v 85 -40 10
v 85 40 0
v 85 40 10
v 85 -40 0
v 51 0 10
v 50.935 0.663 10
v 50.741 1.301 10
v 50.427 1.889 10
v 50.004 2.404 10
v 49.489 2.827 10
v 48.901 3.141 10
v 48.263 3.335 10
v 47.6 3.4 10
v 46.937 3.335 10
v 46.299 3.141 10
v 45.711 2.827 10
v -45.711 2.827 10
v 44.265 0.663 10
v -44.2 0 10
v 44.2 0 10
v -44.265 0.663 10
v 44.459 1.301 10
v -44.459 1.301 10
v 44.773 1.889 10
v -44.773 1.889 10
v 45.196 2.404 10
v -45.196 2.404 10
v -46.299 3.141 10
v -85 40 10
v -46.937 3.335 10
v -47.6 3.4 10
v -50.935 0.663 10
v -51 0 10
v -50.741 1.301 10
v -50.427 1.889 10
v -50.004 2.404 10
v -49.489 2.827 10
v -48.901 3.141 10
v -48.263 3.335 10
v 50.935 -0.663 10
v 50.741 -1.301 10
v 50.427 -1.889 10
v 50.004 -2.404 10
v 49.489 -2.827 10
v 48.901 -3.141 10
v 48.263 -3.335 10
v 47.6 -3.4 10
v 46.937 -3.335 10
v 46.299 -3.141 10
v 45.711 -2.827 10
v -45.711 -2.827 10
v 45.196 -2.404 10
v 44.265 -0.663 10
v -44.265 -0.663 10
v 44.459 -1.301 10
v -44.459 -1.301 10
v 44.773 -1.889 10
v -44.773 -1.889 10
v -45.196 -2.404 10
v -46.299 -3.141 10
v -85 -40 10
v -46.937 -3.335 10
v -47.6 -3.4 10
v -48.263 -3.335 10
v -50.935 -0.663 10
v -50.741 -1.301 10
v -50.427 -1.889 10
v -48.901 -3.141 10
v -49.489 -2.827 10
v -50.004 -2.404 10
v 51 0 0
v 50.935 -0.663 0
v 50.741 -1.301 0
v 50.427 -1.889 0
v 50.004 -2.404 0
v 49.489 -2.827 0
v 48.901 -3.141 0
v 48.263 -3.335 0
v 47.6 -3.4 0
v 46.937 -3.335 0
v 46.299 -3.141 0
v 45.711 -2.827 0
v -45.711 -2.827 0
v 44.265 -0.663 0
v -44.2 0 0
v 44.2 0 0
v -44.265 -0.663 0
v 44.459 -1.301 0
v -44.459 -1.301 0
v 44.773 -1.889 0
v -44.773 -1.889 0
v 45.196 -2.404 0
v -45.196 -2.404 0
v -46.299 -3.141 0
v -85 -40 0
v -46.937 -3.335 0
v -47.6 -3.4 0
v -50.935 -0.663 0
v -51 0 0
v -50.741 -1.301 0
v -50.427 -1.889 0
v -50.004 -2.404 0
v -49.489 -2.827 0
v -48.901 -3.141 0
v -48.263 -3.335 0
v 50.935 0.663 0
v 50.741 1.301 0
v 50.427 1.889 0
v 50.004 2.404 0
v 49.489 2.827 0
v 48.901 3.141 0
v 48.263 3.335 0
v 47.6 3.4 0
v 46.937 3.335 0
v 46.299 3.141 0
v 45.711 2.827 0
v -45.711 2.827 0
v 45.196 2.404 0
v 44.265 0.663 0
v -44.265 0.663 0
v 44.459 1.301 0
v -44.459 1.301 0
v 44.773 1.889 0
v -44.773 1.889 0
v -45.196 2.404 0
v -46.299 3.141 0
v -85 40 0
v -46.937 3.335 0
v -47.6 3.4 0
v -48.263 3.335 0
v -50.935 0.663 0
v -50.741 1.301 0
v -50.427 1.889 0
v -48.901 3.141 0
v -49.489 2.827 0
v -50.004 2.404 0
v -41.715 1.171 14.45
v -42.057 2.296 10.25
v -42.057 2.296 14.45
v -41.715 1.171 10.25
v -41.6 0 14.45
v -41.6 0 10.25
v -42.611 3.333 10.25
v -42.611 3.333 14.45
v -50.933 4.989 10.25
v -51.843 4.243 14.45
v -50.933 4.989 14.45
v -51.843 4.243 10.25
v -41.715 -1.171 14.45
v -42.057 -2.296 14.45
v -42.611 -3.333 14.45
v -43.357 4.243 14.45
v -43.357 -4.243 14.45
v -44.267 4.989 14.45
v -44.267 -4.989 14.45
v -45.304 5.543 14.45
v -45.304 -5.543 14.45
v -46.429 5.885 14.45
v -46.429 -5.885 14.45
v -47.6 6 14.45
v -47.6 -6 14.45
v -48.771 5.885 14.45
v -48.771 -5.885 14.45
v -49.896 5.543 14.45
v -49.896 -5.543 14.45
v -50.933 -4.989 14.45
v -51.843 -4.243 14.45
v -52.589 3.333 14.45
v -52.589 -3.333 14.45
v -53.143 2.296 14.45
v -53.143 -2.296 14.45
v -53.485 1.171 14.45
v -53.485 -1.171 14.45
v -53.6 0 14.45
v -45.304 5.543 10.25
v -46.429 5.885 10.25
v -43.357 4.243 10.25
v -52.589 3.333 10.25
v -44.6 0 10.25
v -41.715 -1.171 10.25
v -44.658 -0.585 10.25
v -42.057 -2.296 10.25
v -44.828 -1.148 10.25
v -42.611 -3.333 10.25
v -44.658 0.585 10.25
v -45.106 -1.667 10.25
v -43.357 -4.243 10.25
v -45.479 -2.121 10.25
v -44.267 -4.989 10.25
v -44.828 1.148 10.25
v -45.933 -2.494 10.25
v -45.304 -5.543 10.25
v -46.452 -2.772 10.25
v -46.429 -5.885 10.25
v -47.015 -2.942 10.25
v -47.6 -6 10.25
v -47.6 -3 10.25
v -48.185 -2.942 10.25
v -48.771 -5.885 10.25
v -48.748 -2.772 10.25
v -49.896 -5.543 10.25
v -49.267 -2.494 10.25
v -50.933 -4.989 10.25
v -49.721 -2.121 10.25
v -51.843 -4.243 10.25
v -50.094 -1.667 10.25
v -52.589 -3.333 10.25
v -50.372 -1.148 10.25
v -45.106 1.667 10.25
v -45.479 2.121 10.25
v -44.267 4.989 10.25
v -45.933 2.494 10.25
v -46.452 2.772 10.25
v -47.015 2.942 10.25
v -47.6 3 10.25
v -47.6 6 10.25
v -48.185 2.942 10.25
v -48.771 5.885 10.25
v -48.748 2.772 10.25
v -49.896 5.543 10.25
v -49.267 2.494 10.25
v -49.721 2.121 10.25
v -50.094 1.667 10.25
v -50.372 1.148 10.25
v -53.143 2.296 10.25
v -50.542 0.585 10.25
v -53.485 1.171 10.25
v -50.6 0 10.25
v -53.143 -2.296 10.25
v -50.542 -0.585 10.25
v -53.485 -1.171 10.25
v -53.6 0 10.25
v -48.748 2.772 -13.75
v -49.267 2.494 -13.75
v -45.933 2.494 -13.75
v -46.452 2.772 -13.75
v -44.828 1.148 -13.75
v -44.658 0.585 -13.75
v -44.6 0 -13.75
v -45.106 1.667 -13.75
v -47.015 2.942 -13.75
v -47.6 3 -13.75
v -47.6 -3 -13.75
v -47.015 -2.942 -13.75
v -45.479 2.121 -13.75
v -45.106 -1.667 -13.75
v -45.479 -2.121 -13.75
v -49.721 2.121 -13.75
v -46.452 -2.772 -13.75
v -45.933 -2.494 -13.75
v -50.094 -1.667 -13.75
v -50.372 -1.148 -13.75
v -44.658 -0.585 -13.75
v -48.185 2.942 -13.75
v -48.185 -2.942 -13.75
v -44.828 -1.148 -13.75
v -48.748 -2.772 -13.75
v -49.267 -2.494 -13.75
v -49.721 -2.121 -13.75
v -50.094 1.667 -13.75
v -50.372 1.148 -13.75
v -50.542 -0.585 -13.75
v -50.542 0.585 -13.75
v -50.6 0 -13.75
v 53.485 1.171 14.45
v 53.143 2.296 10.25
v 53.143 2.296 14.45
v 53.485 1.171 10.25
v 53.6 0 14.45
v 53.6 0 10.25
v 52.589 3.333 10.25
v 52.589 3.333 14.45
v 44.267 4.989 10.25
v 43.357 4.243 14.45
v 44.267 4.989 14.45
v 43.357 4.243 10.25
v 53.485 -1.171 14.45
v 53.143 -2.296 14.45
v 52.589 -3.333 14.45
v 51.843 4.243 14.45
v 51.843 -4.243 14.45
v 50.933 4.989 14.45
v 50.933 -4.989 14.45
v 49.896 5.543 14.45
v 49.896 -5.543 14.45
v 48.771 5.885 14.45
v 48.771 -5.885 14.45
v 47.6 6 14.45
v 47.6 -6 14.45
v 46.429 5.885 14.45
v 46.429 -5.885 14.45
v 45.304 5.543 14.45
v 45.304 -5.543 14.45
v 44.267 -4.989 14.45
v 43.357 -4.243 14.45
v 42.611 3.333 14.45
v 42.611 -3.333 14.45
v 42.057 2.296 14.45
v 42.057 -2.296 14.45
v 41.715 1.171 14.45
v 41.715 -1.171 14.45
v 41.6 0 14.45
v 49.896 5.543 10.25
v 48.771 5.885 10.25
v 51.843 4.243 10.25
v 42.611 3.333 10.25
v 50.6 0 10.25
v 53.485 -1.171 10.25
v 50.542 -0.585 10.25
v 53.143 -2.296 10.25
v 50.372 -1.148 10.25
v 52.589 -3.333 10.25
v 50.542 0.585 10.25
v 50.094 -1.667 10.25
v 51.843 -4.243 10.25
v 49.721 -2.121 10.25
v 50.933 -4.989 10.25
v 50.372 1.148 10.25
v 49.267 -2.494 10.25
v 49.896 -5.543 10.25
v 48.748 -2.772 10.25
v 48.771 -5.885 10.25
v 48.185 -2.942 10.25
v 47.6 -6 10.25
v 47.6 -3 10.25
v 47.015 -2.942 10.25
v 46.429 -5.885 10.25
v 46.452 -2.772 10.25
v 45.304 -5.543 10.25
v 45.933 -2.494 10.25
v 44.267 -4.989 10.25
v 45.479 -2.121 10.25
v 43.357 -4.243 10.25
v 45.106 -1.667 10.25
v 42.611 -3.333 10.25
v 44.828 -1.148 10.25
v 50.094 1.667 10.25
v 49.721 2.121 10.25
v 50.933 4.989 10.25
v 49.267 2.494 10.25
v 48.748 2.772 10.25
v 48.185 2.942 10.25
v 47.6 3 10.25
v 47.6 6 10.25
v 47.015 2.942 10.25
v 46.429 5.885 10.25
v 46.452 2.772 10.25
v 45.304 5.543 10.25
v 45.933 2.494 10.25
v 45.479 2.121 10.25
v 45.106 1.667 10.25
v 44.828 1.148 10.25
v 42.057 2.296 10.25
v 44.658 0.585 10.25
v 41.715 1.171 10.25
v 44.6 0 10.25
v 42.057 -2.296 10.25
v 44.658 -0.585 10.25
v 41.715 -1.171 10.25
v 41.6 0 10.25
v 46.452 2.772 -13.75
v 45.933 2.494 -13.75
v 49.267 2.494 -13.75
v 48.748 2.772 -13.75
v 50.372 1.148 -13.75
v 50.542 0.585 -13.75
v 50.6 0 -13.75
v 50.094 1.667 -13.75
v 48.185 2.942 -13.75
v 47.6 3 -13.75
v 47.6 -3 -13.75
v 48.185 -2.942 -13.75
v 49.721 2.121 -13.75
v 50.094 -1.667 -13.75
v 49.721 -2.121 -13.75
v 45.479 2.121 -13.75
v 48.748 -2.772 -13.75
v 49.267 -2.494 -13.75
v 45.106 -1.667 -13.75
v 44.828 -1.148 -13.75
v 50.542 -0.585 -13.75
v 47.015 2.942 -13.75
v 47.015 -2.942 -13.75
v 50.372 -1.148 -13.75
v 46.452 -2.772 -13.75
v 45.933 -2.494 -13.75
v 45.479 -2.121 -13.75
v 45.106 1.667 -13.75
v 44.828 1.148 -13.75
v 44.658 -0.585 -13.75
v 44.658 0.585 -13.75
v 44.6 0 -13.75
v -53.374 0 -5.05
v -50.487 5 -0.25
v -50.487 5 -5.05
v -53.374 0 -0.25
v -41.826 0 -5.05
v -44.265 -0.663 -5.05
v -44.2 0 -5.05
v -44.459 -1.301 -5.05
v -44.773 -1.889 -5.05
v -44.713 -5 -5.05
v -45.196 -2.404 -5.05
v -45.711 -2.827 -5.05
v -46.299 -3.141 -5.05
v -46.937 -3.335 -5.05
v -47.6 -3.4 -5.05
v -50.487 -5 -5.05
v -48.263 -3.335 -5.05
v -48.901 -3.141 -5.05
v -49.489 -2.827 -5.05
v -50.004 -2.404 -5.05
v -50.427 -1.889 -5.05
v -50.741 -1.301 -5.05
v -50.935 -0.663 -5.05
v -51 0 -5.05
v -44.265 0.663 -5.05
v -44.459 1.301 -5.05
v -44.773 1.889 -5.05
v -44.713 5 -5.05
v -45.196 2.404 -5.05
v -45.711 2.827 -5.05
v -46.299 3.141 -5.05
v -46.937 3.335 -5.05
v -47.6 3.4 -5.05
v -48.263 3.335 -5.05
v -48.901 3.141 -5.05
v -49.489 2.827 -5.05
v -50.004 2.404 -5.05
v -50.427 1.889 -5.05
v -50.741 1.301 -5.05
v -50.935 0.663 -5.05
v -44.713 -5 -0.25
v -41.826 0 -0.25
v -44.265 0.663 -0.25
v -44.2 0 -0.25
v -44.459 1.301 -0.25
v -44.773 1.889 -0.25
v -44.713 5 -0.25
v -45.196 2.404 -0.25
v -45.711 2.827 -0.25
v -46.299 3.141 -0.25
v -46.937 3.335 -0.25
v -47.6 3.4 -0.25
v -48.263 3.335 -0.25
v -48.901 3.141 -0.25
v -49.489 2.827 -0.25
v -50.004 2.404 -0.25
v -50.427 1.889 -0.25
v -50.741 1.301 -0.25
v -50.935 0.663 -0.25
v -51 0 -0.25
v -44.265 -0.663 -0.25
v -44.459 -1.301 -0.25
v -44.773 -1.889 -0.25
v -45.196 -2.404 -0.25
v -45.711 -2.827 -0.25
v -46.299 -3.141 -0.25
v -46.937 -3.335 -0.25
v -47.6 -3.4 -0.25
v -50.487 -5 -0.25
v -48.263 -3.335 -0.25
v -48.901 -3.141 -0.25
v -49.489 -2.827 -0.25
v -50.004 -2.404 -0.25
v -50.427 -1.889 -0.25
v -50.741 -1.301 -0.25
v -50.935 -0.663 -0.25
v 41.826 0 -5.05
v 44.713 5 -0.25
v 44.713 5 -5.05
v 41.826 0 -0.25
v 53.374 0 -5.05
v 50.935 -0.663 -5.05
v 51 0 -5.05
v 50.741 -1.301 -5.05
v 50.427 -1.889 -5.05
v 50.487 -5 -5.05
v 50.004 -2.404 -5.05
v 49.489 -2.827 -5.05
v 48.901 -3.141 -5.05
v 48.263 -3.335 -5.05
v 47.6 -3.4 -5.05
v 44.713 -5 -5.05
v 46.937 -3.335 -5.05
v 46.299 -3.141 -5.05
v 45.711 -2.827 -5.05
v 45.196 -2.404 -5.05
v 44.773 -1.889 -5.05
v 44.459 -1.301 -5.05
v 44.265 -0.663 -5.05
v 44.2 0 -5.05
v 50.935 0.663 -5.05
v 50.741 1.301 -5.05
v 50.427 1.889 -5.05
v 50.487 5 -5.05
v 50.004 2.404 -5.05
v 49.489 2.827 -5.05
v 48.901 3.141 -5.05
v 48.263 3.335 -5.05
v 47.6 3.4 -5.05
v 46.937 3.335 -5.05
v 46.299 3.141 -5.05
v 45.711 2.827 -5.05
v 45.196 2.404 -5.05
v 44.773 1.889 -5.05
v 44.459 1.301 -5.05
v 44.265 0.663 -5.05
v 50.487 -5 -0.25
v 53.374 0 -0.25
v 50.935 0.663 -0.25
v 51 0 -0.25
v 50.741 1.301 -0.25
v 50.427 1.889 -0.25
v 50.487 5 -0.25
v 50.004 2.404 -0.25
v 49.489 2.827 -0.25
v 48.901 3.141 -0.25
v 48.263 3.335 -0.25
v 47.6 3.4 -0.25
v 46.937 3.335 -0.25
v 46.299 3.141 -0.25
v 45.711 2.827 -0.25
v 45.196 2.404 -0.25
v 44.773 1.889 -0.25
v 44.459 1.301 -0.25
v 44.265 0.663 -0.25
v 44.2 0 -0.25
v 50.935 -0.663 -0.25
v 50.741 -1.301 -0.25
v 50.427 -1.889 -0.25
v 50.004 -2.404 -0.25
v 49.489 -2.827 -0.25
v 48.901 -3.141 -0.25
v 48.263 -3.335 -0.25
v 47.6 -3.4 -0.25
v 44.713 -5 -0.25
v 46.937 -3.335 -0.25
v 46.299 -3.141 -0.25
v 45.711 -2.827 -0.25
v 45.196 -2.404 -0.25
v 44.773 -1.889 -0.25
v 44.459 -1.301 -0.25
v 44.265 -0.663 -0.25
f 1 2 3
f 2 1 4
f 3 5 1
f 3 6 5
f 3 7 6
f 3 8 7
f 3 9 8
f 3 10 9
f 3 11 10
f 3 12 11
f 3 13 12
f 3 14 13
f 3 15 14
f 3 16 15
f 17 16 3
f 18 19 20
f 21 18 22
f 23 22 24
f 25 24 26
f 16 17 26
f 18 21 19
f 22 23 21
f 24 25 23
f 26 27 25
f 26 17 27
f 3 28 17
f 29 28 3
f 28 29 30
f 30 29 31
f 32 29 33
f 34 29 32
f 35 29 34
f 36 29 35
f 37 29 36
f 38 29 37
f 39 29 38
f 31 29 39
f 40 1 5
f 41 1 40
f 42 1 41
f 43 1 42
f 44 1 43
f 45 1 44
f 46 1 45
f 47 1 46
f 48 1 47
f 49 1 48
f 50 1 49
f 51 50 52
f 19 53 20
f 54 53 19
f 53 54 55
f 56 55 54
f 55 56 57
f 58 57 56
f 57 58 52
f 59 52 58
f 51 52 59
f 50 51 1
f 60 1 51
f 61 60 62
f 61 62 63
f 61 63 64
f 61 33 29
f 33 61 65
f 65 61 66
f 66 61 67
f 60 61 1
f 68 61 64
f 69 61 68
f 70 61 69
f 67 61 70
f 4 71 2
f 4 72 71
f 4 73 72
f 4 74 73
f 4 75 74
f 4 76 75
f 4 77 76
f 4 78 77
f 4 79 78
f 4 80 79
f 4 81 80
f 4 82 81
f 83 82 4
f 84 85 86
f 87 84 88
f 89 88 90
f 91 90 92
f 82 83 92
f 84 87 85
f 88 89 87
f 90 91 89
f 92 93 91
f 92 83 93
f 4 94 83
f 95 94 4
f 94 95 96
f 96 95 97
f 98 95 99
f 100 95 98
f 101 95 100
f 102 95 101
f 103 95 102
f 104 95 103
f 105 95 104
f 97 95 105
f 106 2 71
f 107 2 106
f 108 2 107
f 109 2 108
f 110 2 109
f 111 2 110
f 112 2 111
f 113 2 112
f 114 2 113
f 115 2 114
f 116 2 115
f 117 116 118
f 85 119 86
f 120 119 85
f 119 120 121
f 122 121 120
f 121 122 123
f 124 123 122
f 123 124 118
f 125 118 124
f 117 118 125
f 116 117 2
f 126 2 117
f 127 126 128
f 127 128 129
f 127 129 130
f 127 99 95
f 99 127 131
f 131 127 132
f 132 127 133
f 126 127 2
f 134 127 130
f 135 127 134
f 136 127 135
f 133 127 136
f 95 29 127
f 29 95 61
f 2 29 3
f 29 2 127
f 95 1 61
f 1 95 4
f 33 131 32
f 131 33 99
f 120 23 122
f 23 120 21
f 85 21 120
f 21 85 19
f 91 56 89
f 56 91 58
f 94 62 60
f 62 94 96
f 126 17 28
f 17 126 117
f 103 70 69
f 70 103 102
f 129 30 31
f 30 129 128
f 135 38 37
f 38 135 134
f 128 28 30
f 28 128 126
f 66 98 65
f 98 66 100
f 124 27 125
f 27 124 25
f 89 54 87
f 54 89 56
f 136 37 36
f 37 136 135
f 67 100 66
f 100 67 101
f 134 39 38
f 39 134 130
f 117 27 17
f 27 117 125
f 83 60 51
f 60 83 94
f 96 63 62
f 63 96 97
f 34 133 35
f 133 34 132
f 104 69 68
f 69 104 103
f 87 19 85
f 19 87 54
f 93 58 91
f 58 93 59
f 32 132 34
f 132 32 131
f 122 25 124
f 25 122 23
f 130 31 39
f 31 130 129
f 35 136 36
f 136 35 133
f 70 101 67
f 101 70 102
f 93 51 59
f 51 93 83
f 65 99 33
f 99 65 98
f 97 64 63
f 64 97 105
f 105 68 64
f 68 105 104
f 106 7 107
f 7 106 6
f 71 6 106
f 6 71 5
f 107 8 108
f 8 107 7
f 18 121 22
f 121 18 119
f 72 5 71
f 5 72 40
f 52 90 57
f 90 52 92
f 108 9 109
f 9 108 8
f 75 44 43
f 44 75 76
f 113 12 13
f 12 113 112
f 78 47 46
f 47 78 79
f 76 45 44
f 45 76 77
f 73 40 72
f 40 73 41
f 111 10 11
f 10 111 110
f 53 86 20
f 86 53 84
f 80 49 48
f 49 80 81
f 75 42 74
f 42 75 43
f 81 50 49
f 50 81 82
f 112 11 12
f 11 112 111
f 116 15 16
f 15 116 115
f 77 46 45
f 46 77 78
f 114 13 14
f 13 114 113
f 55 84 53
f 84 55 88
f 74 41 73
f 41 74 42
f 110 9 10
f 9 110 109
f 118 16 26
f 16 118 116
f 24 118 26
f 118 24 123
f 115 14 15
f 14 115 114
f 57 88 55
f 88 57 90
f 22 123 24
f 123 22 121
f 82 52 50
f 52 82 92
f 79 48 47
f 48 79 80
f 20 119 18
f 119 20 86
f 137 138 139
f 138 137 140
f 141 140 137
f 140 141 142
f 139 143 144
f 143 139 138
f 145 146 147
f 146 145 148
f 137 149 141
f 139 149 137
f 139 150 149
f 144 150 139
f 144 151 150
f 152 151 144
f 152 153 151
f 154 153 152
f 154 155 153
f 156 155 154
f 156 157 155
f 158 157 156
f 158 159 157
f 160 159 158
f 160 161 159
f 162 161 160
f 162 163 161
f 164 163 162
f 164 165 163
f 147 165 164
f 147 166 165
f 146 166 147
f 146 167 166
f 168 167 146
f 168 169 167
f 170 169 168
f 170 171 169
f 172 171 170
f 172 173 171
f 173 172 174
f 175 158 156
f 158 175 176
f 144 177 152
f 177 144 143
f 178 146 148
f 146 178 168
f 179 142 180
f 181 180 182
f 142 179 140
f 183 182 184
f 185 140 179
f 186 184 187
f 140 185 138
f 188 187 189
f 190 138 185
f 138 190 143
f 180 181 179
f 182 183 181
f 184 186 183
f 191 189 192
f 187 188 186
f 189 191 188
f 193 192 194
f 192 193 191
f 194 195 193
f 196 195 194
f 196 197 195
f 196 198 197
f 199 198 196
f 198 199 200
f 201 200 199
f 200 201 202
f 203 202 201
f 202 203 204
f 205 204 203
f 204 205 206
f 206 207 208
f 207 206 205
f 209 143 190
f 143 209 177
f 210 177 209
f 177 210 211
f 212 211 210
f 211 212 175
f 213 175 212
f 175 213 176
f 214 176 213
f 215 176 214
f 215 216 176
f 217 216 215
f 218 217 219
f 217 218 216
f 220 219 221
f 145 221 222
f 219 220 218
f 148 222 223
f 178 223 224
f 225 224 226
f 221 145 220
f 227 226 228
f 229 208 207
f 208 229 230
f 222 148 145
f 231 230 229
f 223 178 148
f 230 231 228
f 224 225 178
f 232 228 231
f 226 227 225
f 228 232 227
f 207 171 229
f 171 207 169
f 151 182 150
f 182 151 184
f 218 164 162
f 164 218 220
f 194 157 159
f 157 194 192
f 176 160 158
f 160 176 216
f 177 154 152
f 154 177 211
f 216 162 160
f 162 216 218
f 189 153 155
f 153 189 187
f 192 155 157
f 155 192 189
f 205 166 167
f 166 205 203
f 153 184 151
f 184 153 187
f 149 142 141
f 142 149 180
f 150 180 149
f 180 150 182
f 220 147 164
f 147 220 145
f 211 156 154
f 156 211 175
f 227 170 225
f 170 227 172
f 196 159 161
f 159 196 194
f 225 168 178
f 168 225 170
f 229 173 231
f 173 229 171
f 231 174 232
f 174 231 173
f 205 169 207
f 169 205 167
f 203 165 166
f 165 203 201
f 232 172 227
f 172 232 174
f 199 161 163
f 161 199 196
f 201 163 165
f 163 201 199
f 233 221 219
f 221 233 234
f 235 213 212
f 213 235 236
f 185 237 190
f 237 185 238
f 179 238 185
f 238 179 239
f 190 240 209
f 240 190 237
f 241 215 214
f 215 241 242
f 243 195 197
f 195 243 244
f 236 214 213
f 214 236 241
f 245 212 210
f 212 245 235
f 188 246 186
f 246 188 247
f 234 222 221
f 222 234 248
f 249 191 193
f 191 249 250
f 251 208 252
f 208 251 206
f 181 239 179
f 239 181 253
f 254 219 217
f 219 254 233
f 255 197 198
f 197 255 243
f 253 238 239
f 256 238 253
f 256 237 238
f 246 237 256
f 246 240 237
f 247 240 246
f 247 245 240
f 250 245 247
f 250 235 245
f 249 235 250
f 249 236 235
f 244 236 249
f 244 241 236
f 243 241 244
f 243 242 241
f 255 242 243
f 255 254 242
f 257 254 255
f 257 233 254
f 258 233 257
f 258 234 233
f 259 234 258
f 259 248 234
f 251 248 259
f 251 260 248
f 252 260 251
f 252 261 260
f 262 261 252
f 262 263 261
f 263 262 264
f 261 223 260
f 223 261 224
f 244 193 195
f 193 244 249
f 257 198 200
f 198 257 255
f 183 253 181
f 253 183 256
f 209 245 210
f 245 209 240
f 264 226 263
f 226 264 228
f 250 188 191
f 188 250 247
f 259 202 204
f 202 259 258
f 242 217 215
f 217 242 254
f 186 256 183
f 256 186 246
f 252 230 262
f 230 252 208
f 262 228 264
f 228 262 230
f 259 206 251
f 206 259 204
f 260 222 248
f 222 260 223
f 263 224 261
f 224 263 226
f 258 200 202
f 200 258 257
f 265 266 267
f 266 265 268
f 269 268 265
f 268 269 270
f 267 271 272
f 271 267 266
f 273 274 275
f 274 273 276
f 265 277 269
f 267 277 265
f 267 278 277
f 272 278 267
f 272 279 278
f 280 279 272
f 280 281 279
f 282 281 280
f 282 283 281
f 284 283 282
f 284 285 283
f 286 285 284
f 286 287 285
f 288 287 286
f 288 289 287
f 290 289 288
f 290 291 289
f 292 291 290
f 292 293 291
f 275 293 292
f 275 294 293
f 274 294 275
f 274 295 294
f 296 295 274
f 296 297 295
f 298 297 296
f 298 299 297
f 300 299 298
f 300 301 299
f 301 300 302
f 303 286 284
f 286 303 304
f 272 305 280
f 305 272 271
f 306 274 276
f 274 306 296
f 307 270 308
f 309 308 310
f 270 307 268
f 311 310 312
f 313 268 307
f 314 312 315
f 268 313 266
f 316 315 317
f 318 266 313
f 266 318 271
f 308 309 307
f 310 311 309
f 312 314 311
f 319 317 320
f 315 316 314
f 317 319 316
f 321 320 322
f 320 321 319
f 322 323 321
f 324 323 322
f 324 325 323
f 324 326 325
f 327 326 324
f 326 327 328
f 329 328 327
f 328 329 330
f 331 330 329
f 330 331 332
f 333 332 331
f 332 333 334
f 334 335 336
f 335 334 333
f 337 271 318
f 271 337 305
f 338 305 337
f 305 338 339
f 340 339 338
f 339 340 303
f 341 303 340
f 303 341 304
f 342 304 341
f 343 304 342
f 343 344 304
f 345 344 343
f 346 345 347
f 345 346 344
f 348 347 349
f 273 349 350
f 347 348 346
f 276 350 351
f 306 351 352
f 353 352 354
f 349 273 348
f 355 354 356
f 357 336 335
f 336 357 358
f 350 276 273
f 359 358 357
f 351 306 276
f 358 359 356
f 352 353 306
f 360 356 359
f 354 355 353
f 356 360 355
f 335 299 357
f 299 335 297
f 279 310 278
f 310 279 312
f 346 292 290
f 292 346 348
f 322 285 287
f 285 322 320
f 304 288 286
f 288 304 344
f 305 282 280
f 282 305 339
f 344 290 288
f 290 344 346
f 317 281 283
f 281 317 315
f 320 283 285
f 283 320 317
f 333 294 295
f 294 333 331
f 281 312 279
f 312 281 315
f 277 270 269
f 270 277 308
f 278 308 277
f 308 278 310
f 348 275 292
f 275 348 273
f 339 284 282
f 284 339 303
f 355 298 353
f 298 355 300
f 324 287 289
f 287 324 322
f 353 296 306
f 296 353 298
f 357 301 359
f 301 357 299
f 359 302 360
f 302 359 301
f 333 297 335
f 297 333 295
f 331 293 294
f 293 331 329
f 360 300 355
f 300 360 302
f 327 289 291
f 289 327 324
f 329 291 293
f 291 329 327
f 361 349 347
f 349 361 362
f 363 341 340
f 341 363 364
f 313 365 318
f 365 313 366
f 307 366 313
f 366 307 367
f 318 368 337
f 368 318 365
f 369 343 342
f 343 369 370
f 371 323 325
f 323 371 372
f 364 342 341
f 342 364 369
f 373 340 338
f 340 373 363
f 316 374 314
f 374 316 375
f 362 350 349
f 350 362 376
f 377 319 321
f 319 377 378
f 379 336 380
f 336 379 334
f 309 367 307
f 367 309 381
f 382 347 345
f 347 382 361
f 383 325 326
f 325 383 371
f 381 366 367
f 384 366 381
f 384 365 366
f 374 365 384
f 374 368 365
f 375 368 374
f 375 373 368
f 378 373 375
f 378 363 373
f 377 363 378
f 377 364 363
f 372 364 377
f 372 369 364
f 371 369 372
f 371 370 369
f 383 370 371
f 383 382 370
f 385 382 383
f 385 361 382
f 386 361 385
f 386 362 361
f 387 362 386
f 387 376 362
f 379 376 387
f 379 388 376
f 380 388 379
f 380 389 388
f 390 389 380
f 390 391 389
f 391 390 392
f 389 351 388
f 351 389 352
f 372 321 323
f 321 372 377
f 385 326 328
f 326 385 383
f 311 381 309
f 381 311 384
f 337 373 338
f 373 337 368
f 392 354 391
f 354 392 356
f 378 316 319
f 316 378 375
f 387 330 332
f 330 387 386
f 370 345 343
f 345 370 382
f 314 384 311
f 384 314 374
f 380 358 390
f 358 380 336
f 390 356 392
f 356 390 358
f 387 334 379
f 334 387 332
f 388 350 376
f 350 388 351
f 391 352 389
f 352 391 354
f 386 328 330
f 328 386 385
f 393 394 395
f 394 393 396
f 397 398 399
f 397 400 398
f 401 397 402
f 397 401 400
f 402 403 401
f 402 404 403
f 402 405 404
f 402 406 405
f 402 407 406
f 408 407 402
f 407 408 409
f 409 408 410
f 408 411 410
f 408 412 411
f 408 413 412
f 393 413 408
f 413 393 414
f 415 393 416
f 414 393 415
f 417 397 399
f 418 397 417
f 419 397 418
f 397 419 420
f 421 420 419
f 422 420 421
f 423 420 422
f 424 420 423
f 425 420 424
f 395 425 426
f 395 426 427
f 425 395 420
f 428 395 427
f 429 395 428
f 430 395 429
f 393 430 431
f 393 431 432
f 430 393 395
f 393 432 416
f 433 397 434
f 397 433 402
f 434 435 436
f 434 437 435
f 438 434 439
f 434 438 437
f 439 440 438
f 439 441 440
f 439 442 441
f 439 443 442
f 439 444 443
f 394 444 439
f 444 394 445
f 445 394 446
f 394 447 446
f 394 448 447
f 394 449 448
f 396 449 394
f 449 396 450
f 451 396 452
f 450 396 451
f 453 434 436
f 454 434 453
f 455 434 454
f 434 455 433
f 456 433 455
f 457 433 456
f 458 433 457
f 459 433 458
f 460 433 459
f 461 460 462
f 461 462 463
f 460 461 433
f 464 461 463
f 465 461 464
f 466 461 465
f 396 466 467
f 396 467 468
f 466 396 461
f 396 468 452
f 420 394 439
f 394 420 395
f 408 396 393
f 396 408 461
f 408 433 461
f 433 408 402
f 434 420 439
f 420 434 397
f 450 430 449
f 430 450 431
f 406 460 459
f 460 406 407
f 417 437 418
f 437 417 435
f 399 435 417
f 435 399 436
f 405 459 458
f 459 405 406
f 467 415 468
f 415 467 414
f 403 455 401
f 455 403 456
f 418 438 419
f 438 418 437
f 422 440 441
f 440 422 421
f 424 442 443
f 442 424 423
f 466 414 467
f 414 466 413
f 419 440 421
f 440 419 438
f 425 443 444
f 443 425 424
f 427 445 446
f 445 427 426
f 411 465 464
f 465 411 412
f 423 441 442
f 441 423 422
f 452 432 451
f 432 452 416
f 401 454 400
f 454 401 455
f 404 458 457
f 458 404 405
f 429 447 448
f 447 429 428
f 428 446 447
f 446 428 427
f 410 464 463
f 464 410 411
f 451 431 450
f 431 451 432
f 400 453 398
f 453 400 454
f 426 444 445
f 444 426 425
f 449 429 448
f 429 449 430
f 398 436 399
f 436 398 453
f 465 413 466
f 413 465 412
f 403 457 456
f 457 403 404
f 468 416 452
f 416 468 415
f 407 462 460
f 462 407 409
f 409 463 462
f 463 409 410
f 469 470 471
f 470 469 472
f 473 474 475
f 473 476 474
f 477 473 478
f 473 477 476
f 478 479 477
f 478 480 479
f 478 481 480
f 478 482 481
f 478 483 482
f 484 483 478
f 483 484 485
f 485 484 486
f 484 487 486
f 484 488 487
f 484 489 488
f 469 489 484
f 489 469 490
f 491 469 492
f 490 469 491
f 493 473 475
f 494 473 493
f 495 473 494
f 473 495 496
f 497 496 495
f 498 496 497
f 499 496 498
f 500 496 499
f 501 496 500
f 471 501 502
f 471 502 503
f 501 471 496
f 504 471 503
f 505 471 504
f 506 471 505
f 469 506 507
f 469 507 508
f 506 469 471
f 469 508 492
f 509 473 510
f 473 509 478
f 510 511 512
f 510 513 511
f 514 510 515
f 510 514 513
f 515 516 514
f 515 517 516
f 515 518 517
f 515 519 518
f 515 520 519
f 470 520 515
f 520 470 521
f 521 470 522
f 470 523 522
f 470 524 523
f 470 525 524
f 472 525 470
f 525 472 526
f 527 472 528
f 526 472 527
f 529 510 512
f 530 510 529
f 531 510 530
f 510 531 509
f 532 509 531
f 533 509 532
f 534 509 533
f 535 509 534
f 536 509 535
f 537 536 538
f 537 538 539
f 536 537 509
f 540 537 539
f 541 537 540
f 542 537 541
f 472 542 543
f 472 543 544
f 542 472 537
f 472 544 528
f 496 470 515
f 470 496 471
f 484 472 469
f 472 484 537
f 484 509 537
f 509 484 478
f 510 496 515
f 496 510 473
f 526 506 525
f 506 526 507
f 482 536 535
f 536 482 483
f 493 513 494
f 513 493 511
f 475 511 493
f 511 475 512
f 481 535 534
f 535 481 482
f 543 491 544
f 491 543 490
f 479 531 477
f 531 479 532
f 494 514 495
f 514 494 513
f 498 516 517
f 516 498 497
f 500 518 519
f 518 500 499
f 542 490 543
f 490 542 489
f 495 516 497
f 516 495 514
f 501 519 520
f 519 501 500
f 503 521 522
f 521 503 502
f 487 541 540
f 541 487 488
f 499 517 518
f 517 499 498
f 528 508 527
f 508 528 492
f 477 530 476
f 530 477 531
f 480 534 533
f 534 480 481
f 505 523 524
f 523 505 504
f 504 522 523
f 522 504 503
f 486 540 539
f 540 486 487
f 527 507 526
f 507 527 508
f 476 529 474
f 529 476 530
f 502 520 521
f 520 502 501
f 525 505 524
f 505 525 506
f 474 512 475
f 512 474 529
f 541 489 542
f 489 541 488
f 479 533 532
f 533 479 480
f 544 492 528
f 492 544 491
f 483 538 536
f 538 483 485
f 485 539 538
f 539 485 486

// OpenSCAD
$fn = 32;

// ------------------------------------------------------------------------
// Bolted plate: 170 x 80 x 10 mm plate, 2 fasteners
// Every part is its own module, assembly() places them once.
// ------------------------------------------------------------------------

// --- part 1 ---
module plate() {
  difference() {
    translate([-85, -40, 0]) cube([170, 80, 10]);
    translate([-47.6, 0, -1]) cylinder(h = 12, d = 6.8);
    translate([47.6, 0, -1]) cylinder(h = 12, d = 6.8);
  }
}

// --- part 2 ---
module bolt1() {
  cylinder(h = 4.2, d = 12);
  translate([0, 0, -24]) cylinder(h = 24, d = 6);
}

// --- part 3 ---
module bolt2() {
  cylinder(h = 4.2, d = 12);
  translate([0, 0, -24]) cylinder(h = 24, d = 6);
}

// --- part 4 ---
module nut1() {
  difference() {
    linear_extrude(height = 4.8) polygon(points = [[5.774, 0], [2.887, 5], [-2.887, 5], [-5.774, 0], [-2.887, -5], [2.887, -5]]);
    translate([0, 0, -1]) cylinder(h = 6.8, d = 6.8);
  }
}

// --- part 5 ---
module nut2() {
  difference() {
    linear_extrude(height = 4.8) polygon(points = [[5.774, 0], [2.887, 5], [-2.887, 5], [-5.774, 0], [-2.887, -5], [2.887, -5]]);
    translate([0, 0, -1]) cylinder(h = 6.8, d = 6.8);
  }
}

// --- assembly ---
module assembly() {
  translate([0, 0, 0]) rotate([0, 0, 0]) plate();
  translate([-47.6, 0, 10.25]) rotate([0, 0, 0]) bolt1();
  translate([47.6, 0, 10.25]) rotate([0, 0, 0]) bolt2();
  translate([-47.6, 0, -5.05]) rotate([0, 0, 0]) nut1();
  translate([47.6, 0, -5.05]) rotate([0, 0, 0]) nut2();
}

assembly();
